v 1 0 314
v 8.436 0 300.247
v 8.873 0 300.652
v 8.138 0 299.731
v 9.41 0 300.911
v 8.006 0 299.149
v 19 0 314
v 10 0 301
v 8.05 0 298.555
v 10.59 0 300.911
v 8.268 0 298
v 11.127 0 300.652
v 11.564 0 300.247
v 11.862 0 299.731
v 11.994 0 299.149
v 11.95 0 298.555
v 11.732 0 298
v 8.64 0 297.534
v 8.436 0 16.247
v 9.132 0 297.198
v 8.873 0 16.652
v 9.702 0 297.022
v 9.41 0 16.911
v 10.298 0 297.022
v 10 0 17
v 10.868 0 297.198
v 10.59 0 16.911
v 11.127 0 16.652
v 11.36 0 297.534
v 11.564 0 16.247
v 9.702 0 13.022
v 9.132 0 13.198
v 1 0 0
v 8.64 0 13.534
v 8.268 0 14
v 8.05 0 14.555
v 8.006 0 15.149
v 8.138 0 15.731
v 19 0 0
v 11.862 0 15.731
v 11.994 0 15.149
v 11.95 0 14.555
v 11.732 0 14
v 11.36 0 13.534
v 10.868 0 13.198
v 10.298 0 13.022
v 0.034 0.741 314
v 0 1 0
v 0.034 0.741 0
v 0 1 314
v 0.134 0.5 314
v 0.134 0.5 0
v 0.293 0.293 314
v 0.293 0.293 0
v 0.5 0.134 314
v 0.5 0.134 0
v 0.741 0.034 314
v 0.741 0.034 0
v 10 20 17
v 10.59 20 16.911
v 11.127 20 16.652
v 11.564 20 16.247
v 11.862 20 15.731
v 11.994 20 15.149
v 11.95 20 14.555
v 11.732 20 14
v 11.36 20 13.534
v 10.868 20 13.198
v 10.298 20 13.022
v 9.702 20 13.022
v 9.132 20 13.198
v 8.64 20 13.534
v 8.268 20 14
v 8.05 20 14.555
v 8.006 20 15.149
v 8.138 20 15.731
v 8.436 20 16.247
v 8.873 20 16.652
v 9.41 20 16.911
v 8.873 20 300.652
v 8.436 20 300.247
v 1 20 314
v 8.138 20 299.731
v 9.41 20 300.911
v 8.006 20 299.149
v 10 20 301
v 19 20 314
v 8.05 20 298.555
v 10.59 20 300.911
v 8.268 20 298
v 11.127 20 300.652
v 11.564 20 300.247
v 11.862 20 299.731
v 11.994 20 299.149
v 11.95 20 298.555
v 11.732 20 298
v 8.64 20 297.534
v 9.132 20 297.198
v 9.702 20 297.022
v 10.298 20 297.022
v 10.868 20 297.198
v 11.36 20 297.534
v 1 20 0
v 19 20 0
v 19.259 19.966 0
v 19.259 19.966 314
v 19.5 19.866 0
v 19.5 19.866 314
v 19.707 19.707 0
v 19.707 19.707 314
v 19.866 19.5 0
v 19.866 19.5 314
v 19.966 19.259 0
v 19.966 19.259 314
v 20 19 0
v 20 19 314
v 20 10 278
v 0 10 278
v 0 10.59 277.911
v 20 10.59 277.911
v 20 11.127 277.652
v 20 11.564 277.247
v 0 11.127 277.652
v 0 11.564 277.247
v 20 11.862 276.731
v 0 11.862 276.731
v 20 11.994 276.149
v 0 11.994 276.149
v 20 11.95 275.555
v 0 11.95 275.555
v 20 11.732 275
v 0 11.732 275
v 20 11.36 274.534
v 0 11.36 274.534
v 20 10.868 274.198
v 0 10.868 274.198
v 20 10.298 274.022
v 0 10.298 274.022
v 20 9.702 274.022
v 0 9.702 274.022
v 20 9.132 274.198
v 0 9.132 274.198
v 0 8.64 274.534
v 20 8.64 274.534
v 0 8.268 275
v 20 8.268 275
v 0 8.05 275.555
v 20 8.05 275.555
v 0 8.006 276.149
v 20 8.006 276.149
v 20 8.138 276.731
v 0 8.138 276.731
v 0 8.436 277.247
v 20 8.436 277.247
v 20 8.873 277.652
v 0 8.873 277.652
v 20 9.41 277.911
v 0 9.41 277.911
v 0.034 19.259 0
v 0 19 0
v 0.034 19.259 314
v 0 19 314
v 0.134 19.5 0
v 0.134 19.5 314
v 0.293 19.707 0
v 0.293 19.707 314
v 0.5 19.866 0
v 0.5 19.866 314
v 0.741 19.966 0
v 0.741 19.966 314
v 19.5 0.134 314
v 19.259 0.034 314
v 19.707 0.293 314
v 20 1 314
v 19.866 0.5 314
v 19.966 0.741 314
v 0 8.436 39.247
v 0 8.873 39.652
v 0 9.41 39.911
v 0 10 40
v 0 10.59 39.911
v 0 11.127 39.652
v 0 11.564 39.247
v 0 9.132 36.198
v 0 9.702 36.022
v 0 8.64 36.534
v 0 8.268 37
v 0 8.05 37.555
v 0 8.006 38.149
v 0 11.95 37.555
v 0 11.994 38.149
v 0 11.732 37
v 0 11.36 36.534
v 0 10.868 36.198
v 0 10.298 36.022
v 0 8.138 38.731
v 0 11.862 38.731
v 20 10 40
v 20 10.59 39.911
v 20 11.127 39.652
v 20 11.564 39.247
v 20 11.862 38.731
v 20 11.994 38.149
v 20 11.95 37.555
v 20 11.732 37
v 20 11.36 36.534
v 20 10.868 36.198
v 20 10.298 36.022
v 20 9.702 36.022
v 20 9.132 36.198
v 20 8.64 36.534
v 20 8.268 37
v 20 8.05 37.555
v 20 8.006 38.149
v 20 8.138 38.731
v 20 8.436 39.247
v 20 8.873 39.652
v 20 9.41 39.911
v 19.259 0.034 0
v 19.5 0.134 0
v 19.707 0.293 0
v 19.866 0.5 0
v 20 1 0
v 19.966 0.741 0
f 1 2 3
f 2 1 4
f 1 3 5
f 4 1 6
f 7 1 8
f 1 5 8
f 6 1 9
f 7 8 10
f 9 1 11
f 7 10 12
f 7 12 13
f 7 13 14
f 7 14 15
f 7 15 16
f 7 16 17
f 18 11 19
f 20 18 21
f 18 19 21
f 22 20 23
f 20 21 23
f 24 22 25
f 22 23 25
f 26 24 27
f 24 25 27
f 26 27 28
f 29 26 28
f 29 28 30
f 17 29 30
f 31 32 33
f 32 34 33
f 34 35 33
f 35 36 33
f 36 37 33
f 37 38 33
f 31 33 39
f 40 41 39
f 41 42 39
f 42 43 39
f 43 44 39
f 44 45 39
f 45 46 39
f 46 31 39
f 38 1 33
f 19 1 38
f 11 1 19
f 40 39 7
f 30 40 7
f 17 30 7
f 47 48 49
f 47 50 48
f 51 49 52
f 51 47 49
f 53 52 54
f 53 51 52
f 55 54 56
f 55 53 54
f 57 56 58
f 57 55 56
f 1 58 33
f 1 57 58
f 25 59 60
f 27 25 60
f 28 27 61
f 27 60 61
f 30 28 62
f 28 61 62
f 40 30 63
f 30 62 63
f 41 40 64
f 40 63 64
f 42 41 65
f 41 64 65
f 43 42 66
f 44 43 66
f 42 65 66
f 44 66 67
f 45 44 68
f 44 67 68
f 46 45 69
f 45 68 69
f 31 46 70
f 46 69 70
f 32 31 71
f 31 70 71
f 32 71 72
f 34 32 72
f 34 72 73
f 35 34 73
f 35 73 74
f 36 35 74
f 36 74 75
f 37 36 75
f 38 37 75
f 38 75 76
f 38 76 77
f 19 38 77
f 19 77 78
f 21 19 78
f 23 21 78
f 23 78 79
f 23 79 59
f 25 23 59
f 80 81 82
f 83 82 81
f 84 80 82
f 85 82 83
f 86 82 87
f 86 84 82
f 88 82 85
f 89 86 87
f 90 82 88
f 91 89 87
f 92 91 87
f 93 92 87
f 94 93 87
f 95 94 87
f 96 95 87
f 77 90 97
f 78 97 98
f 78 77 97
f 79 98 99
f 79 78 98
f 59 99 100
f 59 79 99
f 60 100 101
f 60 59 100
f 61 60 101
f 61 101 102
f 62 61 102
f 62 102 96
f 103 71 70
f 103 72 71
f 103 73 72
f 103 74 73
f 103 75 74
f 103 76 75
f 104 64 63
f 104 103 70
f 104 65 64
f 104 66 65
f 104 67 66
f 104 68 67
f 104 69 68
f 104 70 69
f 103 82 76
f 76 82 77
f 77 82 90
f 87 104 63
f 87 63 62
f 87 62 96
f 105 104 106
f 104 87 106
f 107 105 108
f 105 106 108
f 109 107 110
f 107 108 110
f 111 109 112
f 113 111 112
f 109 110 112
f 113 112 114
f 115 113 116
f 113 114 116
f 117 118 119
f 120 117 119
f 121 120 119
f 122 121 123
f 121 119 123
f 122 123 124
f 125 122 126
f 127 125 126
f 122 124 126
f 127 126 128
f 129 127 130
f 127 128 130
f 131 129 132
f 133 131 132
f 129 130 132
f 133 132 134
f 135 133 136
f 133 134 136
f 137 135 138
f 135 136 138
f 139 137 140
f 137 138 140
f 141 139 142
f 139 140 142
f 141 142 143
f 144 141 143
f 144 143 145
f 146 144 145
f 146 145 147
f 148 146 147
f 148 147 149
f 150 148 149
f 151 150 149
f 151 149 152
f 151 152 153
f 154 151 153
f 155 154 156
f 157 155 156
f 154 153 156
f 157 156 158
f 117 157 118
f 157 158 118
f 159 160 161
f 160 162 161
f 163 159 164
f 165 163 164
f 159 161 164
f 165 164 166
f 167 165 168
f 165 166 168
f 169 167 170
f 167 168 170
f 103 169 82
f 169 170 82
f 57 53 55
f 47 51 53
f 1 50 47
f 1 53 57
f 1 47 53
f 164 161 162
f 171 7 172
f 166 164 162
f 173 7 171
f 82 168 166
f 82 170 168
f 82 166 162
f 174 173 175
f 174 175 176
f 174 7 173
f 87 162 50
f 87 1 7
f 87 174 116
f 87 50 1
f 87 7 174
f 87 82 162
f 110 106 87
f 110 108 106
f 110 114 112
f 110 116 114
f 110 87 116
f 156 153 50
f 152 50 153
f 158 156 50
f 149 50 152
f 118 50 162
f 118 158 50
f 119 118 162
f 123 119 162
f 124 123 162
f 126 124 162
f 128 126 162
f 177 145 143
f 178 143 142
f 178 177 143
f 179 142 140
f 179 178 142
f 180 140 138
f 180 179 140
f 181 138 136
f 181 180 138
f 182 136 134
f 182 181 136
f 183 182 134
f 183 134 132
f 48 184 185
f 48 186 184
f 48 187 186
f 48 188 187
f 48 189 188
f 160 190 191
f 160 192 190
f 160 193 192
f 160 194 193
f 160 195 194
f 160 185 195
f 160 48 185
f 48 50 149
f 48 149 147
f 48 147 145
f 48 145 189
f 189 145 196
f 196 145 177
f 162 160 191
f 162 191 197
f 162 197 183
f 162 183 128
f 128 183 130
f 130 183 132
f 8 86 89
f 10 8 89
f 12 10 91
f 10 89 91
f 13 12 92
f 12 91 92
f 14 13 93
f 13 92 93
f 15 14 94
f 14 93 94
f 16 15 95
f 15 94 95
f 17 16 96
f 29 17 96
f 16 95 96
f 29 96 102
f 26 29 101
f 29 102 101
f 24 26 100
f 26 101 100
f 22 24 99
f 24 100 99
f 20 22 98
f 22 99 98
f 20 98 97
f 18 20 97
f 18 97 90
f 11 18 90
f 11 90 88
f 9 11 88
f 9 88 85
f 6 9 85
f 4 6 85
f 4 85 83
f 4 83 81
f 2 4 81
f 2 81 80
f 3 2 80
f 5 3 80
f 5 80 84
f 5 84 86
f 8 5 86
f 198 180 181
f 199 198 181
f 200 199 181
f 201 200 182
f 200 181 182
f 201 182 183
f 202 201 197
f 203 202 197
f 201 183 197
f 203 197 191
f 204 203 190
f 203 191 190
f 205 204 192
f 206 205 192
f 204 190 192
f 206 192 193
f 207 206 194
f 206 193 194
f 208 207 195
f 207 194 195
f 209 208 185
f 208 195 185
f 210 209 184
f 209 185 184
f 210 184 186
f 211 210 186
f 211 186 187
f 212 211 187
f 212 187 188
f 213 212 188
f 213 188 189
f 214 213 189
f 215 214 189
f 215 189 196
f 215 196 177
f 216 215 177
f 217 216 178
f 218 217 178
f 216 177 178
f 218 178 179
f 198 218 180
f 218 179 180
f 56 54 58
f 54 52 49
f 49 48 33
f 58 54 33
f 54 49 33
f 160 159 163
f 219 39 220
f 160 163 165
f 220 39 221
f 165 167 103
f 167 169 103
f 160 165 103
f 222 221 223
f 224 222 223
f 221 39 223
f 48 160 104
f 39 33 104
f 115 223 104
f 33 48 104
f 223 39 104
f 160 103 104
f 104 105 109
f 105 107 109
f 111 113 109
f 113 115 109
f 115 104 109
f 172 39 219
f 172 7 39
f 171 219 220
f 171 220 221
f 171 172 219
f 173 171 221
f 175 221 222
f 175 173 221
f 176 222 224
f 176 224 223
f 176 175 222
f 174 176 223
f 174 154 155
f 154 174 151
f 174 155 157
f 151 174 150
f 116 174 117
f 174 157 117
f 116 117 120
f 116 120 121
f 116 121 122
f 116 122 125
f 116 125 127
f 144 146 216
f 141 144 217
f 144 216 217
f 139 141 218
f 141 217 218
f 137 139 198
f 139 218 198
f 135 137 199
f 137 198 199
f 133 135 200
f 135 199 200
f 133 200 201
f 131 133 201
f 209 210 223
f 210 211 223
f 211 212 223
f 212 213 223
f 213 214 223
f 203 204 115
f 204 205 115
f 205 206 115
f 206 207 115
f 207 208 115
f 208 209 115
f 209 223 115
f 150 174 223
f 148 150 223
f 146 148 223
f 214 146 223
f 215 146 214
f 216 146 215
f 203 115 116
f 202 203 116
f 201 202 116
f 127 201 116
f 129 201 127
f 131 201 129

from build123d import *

# Parameters (mm, degrees)
SKETCH_1_W          = 20
SKETCH_1_H          = 20
EXTRUDE_1_DEPTH     = 314
SKETCH_2_R          = 2
CUT_EXTRUDE_1_DEPTH = 314
FILLET_1_R          = 1
SKETCH_3_R          = 2
CUT_EXTRUDE_2_DEPTH = 20


with BuildPart() as part:
    # 草图1 → 凸台-拉伸1 (new body)
    with BuildSketch(Plane.XY):
        with Locations((10, 10)):
            Rectangle(SKETCH_1_W, SKETCH_1_H)
    extrude(amount=EXTRUDE_1_DEPTH)

    # 草图2 → 切除-拉伸1 (cut)
    with BuildSketch(Plane(origin=(0, 20, 0), x_dir=(1, 0, 0), z_dir=(0, 1, 0))):
        with Locations(Location((10, -15, 0), (0, 0, 270))):
            Circle(SKETCH_2_R)
        with Locations(Location((10, -299, 0), (0, 0, 270))):
            Circle(SKETCH_2_R)
    extrude(amount=-CUT_EXTRUDE_1_DEPTH, mode=Mode.SUBTRACT)

    # 圆角1
    fillet_1_edges = [part.edges().sort_by_distance(p)[0] for p in [
        (0, 20, 157),
        (20, 20, 157),
        (20, 0, 157),
        (0, 0, 157),
    ]]
    fillet(fillet_1_edges, radius=FILLET_1_R)

    # 草图3 → 切除-拉伸2 (cut)
    with BuildSketch(Plane.ZY):
        with Locations((38, 10)):
            Circle(SKETCH_3_R)
        with Locations((276, 10)):
            Circle(SKETCH_3_R)
    extrude(amount=-CUT_EXTRUDE_2_DEPTH, mode=Mode.SUBTRACT)


solid = part.part
